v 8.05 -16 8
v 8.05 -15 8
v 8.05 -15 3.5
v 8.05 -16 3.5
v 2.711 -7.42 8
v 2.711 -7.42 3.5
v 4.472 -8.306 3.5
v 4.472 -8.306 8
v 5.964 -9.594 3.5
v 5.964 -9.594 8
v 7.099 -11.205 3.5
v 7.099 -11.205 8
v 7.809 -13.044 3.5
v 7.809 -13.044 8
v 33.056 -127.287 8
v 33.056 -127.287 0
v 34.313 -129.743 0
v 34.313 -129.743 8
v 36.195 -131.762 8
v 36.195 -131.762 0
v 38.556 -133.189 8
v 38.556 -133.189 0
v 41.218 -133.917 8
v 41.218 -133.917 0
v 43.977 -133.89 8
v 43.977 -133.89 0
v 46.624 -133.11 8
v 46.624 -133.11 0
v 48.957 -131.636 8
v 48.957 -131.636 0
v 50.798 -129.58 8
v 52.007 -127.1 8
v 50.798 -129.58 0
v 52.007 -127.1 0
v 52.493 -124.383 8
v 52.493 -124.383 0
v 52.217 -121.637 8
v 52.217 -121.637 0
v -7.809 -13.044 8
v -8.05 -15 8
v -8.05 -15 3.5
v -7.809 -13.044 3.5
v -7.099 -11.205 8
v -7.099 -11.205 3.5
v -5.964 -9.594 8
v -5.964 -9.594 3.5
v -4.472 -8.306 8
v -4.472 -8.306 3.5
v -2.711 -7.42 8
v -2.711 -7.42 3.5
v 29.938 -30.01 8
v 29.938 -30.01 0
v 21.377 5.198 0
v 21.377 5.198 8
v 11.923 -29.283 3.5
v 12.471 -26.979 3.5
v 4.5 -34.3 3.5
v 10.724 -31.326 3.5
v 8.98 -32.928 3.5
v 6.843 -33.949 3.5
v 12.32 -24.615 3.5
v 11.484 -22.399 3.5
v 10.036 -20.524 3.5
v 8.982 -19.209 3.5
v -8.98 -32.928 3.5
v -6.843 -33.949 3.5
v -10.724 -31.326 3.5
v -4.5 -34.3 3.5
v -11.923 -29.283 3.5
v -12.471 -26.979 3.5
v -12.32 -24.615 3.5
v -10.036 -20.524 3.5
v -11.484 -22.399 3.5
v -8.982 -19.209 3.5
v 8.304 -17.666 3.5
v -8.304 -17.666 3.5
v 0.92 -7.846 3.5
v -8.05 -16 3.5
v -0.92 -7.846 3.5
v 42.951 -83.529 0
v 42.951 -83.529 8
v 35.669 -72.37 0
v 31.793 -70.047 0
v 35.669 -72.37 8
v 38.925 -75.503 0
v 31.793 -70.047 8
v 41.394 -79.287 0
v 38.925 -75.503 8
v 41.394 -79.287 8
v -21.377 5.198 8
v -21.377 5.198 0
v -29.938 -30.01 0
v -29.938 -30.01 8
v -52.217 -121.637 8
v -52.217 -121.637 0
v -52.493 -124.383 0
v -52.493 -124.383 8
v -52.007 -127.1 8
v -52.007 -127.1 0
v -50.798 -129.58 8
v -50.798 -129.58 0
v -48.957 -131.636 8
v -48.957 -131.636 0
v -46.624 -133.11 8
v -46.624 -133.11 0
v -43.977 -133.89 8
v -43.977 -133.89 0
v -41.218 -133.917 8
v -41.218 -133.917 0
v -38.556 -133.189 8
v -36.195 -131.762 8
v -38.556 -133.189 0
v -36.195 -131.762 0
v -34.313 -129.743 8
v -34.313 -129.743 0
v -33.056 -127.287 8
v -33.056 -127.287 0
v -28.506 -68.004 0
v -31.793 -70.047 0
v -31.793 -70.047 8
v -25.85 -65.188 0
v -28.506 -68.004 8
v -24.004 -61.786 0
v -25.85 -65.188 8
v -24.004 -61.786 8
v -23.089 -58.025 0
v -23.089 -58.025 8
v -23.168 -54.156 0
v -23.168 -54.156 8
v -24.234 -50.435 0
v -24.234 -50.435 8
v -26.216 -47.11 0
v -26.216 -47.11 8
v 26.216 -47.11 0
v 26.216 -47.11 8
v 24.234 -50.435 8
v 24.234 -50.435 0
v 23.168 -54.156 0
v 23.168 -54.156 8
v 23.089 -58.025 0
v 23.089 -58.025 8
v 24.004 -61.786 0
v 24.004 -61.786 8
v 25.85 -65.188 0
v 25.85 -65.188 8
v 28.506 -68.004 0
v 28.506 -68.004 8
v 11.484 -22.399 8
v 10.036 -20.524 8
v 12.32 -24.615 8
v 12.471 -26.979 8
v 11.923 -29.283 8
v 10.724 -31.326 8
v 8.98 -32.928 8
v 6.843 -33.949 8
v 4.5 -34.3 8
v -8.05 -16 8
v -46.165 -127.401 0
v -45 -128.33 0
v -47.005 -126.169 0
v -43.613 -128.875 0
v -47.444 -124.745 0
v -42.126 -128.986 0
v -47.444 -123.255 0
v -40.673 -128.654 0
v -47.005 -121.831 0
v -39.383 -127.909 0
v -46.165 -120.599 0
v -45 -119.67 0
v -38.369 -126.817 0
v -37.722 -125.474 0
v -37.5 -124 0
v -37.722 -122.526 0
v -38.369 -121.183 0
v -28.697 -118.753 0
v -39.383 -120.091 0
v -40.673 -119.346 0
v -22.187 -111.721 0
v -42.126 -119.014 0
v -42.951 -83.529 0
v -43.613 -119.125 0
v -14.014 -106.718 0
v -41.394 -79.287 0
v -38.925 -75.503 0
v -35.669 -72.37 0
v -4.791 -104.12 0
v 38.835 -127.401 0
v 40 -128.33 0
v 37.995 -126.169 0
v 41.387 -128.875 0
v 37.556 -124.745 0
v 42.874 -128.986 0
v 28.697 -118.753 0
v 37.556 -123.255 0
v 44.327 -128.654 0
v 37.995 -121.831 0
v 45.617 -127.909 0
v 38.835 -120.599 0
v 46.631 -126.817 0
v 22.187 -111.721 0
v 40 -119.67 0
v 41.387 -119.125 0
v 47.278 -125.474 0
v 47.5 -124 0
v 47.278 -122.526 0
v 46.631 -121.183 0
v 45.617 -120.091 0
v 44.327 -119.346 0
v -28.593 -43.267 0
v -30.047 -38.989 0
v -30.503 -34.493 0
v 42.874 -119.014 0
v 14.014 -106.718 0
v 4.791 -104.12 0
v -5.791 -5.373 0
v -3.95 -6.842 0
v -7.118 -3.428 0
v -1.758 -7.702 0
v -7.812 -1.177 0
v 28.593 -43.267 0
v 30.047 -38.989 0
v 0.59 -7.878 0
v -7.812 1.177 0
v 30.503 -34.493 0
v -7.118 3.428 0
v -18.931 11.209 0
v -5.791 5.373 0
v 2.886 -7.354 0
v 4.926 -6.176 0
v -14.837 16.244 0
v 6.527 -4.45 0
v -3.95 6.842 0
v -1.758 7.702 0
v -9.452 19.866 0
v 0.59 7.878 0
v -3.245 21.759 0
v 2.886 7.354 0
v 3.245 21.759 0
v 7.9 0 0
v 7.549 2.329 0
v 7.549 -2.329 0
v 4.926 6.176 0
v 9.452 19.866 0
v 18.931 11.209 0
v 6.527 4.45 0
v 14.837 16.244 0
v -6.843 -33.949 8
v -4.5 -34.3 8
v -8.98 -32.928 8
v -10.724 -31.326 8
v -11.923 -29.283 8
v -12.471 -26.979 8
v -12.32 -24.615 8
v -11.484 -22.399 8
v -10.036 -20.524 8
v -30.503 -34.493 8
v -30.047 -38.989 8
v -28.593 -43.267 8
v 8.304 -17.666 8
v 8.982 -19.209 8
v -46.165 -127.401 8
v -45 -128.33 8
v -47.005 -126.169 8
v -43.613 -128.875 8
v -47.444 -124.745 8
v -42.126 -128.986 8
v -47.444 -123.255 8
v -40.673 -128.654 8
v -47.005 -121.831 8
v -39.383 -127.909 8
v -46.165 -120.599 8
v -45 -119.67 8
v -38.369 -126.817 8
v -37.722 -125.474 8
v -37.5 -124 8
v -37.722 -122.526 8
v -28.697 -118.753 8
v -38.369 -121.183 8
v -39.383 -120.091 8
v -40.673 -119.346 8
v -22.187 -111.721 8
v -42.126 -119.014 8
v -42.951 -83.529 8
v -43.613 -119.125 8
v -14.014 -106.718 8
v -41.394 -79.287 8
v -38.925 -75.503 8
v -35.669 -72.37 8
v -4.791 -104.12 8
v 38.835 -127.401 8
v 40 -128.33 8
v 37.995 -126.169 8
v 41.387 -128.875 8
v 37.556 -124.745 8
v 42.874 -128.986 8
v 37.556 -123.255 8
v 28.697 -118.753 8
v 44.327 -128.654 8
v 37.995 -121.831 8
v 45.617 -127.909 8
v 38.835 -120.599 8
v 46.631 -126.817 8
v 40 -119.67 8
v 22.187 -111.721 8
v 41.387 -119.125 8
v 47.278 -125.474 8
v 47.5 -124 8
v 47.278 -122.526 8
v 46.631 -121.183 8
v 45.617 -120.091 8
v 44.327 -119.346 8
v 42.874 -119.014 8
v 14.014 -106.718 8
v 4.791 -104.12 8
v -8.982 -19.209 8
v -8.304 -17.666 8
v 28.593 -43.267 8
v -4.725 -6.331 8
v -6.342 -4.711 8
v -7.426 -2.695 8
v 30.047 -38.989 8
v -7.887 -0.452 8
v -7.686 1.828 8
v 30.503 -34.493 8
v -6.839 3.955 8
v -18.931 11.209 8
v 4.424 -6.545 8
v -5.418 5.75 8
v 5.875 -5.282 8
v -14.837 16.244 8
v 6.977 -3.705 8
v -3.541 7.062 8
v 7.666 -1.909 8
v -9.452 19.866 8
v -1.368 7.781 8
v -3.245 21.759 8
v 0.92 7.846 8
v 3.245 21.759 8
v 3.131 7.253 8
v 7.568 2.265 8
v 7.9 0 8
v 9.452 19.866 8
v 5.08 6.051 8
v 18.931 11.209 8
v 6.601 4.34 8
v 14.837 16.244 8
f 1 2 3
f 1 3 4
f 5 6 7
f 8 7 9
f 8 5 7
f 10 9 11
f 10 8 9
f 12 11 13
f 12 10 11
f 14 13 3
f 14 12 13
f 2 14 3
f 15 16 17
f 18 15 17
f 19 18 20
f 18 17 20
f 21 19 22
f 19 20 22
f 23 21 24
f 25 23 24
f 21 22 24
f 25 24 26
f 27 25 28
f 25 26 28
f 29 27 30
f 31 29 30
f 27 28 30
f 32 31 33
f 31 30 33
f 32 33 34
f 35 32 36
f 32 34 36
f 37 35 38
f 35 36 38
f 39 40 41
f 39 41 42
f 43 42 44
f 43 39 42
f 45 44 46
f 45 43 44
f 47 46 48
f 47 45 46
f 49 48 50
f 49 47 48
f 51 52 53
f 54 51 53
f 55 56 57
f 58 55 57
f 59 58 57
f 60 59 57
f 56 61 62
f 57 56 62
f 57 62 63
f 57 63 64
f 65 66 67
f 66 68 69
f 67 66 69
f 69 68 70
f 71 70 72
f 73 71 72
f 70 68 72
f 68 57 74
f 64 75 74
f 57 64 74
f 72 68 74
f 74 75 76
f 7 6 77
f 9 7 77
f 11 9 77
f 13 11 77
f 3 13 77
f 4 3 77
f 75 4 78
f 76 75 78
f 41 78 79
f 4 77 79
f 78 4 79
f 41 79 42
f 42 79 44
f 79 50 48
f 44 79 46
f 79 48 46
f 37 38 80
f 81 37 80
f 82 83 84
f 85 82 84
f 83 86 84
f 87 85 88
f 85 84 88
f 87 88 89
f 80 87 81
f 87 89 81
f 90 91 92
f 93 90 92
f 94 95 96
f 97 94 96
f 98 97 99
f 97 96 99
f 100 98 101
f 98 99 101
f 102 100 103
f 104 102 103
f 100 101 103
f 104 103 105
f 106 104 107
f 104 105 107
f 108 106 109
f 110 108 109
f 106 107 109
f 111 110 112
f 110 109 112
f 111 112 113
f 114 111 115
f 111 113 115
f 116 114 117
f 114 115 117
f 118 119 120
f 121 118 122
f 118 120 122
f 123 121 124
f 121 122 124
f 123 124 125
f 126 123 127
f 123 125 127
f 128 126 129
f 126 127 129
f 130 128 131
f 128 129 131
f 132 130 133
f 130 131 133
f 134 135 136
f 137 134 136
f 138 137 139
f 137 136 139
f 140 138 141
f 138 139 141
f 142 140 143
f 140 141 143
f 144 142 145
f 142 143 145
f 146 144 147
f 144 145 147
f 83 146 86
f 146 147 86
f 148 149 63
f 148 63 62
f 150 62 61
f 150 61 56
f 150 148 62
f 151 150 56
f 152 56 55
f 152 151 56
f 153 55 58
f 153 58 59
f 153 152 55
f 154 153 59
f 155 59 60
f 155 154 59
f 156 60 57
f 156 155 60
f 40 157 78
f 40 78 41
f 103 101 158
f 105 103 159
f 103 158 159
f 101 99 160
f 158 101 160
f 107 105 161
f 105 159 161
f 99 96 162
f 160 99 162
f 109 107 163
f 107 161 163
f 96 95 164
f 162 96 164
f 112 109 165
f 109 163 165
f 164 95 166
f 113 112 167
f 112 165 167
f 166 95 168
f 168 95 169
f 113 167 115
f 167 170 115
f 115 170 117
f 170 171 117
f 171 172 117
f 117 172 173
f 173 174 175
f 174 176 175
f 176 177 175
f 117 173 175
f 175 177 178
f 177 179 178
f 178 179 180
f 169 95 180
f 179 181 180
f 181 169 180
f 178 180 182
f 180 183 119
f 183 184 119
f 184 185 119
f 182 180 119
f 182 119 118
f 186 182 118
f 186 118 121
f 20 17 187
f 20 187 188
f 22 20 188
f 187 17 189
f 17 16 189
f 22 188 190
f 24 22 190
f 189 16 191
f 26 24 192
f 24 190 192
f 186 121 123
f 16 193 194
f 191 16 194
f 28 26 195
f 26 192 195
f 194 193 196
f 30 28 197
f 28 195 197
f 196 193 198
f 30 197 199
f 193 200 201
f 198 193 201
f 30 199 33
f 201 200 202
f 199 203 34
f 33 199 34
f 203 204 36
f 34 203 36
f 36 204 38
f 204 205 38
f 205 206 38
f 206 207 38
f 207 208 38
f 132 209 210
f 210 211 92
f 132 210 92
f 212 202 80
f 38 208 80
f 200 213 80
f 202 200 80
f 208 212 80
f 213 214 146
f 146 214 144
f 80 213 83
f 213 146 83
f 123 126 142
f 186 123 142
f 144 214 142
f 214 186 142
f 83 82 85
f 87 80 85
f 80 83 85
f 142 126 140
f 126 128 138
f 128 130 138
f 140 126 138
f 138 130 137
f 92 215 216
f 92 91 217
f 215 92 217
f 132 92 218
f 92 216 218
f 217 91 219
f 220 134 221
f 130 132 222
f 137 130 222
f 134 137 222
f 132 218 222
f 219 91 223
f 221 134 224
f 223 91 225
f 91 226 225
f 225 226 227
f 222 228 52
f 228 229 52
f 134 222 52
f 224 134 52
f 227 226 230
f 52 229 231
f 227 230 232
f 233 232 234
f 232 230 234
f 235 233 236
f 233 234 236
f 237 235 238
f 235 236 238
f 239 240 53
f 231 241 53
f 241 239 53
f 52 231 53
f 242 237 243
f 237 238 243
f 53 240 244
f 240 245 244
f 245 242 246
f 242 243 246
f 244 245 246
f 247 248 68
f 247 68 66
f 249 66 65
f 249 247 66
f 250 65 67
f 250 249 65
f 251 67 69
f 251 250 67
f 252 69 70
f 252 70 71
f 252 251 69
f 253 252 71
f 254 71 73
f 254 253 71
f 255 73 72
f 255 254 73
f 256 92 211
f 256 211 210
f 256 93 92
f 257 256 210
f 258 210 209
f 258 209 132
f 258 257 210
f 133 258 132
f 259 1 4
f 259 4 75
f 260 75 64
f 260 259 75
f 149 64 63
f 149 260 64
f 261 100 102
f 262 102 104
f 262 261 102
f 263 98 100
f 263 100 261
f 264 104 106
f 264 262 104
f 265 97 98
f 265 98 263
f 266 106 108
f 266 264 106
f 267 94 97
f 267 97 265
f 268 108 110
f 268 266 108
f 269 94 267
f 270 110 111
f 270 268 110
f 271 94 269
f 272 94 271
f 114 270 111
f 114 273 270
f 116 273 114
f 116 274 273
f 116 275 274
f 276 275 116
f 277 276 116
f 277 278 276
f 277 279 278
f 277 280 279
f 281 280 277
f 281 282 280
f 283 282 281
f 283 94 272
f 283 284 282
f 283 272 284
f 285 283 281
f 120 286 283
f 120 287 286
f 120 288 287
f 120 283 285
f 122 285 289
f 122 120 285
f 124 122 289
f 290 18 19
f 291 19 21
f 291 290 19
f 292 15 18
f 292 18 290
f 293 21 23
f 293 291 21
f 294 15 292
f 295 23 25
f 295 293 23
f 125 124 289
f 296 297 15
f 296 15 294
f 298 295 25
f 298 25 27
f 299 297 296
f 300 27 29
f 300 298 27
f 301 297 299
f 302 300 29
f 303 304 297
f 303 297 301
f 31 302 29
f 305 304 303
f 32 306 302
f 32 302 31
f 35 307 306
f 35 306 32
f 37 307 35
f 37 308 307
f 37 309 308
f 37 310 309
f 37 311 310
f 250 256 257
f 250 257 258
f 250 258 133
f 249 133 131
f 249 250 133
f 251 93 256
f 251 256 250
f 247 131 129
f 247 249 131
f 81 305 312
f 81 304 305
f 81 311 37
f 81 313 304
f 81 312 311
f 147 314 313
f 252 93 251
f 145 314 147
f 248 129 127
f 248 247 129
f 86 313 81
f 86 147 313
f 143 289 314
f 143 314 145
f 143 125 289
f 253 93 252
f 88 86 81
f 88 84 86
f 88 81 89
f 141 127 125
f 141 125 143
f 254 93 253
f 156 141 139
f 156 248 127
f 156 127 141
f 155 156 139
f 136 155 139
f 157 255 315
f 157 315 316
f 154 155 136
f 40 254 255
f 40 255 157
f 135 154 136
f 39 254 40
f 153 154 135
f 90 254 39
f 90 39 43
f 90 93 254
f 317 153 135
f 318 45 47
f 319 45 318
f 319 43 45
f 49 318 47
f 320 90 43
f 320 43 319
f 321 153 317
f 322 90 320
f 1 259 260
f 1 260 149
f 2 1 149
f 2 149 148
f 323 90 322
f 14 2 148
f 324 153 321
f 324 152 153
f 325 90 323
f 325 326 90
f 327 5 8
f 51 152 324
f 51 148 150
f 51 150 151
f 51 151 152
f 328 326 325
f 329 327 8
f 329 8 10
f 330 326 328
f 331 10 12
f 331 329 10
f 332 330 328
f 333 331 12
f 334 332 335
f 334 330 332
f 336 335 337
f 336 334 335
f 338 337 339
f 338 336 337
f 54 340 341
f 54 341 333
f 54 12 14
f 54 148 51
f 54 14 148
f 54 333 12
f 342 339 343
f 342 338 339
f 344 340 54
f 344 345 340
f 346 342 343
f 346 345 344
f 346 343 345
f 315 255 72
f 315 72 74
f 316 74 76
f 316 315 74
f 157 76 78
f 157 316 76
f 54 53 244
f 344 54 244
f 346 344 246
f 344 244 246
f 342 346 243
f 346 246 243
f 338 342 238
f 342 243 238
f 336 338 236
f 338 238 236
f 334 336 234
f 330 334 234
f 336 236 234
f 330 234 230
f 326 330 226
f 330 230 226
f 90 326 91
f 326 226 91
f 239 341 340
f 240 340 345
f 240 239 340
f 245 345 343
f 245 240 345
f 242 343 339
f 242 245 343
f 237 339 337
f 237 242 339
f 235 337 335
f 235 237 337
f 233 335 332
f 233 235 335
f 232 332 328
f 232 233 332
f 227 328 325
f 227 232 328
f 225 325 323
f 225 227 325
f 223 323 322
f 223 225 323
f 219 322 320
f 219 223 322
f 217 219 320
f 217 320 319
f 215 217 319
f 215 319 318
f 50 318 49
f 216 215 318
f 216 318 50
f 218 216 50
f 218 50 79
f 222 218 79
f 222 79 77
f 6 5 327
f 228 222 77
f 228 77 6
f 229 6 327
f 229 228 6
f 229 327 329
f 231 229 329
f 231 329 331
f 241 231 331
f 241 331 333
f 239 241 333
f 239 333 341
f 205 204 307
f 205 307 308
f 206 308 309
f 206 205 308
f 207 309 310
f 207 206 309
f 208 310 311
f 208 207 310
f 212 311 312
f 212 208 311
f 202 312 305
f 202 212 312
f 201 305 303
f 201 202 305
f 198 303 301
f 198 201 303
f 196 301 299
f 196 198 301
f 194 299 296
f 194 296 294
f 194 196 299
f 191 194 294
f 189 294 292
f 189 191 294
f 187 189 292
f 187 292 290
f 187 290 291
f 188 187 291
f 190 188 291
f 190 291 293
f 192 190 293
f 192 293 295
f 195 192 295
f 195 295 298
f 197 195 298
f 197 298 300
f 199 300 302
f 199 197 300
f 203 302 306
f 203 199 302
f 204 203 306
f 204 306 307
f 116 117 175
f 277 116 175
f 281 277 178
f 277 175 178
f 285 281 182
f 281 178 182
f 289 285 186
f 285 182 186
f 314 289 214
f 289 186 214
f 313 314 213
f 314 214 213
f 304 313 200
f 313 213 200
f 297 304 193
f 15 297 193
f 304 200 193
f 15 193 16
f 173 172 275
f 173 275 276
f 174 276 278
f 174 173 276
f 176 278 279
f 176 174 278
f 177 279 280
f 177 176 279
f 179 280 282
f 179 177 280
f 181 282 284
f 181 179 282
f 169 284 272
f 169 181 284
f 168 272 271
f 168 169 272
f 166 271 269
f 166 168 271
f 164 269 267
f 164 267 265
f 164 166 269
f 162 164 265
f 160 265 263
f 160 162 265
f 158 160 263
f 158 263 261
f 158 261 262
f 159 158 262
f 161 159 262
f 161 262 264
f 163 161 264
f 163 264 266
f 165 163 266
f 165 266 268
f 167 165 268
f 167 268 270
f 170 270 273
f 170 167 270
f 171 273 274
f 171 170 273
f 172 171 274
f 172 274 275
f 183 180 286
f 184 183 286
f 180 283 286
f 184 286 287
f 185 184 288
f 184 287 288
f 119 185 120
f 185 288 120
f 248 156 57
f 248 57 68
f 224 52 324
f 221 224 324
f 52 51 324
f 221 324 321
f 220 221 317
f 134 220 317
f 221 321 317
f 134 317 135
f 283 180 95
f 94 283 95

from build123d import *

# Parameters (mm, degrees)
SKETCH_1_R          = 7.9
SKETCH_1_R_2        = 5
EXTRUDE_1_DEPTH     = 8
CUT_EXTRUDE_1_DEPTH = 4.5
SKETCH_3_R          = 15
CUT_EXTRUDE_2_DEPTH = 9
FILLET_1_R          = 20


with BuildPart() as part:
    # Эскиз1 → Бобышка-Вытянуть1 (new body)
    with BuildSketch(Plane.XY):
        with BuildLine():
            Line((-21.377154159, 5.197814933), (-52.216888254, -121.637356848))
            ThreePointArc((-52.216888254, -121.637356848), (-45.327959859, -133.591800823), (-33.055555556, -127.286710991))
            ThreePointArc((-33.055555556, -127.286710991), (0, -103.790199458), (33.055555556, -127.286710991))
            ThreePointArc((33.055555556, -127.286710991), (45.327959859, -133.591800823), (52.216888254, -121.637356848))
            Line((52.216888254, -121.637356848), (21.377154159, 5.197814933))
            ThreePointArc((21.377154159, 5.197814933), (0, 22), (-21.377154159, 5.197814933))
        make_face()
        Circle(SKETCH_1_R, mode=Mode.SUBTRACT)
        with Locations((-42.5, -124)):
            Circle(SKETCH_1_R_2, mode=Mode.SUBTRACT)
        with Locations((42.5, -124)):
            Circle(SKETCH_1_R_2, mode=Mode.SUBTRACT)
    extrude(amount=EXTRUDE_1_DEPTH)

    # Эскиз2 → Вырез-Вытянуть1 (cut)
    with BuildSketch(Plane.XY.offset(8)):
        with BuildLine():
            Line((4.5, -34.3), (-4.5, -34.3))
            ThreePointArc((-4.5, -34.3), (-11.923093689, -29.282897935), (-10.035582708, -20.524420022))
            ThreePointArc((-10.035582708, -20.524420022), (-8.5923829, -18.459875841), (-8.05, -16))
            Line((-8.05, -16), (-8.05, -15))
            ThreePointArc((-8.05, -15), (0, -6.95), (8.05, -15))
            Line((8.05, -15), (8.05, -16))
            ThreePointArc((8.05, -16), (8.5923829, -18.459875841), (10.035582708, -20.524420022))
            ThreePointArc((10.035582708, -20.524420022), (11.923093689, -29.282897935), (4.5, -34.3))
        make_face()
    extrude(amount=-CUT_EXTRUDE_1_DEPTH, mode=Mode.SUBTRACT)

    # Эскиз3 → Вырез-Вытянуть2 (cut, through all)
    with BuildSketch(Plane.XY.offset(8)):
        with Locations((-38, -56.391488719)):
            Circle(SKETCH_3_R)
        with Locations((38, -56.391488719)):
            Circle(SKETCH_3_R)
    extrude(amount=-CUT_EXTRUDE_2_DEPTH, mode=Mode.SUBTRACT)

    # Скругление1
    fillet_1_edges = [part.edges().sort_by_distance(p)[0] for p in [
        (-39.968167407, -71.261805362, 4),
        (-32.920720313, -42.277633191, 4),
        (32.920720313, -42.277633191, 4),
        (39.968167407, -71.261805362, 4),
    ]]
    fillet(fillet_1_edges, radius=FILLET_1_R)


solid = part.part
